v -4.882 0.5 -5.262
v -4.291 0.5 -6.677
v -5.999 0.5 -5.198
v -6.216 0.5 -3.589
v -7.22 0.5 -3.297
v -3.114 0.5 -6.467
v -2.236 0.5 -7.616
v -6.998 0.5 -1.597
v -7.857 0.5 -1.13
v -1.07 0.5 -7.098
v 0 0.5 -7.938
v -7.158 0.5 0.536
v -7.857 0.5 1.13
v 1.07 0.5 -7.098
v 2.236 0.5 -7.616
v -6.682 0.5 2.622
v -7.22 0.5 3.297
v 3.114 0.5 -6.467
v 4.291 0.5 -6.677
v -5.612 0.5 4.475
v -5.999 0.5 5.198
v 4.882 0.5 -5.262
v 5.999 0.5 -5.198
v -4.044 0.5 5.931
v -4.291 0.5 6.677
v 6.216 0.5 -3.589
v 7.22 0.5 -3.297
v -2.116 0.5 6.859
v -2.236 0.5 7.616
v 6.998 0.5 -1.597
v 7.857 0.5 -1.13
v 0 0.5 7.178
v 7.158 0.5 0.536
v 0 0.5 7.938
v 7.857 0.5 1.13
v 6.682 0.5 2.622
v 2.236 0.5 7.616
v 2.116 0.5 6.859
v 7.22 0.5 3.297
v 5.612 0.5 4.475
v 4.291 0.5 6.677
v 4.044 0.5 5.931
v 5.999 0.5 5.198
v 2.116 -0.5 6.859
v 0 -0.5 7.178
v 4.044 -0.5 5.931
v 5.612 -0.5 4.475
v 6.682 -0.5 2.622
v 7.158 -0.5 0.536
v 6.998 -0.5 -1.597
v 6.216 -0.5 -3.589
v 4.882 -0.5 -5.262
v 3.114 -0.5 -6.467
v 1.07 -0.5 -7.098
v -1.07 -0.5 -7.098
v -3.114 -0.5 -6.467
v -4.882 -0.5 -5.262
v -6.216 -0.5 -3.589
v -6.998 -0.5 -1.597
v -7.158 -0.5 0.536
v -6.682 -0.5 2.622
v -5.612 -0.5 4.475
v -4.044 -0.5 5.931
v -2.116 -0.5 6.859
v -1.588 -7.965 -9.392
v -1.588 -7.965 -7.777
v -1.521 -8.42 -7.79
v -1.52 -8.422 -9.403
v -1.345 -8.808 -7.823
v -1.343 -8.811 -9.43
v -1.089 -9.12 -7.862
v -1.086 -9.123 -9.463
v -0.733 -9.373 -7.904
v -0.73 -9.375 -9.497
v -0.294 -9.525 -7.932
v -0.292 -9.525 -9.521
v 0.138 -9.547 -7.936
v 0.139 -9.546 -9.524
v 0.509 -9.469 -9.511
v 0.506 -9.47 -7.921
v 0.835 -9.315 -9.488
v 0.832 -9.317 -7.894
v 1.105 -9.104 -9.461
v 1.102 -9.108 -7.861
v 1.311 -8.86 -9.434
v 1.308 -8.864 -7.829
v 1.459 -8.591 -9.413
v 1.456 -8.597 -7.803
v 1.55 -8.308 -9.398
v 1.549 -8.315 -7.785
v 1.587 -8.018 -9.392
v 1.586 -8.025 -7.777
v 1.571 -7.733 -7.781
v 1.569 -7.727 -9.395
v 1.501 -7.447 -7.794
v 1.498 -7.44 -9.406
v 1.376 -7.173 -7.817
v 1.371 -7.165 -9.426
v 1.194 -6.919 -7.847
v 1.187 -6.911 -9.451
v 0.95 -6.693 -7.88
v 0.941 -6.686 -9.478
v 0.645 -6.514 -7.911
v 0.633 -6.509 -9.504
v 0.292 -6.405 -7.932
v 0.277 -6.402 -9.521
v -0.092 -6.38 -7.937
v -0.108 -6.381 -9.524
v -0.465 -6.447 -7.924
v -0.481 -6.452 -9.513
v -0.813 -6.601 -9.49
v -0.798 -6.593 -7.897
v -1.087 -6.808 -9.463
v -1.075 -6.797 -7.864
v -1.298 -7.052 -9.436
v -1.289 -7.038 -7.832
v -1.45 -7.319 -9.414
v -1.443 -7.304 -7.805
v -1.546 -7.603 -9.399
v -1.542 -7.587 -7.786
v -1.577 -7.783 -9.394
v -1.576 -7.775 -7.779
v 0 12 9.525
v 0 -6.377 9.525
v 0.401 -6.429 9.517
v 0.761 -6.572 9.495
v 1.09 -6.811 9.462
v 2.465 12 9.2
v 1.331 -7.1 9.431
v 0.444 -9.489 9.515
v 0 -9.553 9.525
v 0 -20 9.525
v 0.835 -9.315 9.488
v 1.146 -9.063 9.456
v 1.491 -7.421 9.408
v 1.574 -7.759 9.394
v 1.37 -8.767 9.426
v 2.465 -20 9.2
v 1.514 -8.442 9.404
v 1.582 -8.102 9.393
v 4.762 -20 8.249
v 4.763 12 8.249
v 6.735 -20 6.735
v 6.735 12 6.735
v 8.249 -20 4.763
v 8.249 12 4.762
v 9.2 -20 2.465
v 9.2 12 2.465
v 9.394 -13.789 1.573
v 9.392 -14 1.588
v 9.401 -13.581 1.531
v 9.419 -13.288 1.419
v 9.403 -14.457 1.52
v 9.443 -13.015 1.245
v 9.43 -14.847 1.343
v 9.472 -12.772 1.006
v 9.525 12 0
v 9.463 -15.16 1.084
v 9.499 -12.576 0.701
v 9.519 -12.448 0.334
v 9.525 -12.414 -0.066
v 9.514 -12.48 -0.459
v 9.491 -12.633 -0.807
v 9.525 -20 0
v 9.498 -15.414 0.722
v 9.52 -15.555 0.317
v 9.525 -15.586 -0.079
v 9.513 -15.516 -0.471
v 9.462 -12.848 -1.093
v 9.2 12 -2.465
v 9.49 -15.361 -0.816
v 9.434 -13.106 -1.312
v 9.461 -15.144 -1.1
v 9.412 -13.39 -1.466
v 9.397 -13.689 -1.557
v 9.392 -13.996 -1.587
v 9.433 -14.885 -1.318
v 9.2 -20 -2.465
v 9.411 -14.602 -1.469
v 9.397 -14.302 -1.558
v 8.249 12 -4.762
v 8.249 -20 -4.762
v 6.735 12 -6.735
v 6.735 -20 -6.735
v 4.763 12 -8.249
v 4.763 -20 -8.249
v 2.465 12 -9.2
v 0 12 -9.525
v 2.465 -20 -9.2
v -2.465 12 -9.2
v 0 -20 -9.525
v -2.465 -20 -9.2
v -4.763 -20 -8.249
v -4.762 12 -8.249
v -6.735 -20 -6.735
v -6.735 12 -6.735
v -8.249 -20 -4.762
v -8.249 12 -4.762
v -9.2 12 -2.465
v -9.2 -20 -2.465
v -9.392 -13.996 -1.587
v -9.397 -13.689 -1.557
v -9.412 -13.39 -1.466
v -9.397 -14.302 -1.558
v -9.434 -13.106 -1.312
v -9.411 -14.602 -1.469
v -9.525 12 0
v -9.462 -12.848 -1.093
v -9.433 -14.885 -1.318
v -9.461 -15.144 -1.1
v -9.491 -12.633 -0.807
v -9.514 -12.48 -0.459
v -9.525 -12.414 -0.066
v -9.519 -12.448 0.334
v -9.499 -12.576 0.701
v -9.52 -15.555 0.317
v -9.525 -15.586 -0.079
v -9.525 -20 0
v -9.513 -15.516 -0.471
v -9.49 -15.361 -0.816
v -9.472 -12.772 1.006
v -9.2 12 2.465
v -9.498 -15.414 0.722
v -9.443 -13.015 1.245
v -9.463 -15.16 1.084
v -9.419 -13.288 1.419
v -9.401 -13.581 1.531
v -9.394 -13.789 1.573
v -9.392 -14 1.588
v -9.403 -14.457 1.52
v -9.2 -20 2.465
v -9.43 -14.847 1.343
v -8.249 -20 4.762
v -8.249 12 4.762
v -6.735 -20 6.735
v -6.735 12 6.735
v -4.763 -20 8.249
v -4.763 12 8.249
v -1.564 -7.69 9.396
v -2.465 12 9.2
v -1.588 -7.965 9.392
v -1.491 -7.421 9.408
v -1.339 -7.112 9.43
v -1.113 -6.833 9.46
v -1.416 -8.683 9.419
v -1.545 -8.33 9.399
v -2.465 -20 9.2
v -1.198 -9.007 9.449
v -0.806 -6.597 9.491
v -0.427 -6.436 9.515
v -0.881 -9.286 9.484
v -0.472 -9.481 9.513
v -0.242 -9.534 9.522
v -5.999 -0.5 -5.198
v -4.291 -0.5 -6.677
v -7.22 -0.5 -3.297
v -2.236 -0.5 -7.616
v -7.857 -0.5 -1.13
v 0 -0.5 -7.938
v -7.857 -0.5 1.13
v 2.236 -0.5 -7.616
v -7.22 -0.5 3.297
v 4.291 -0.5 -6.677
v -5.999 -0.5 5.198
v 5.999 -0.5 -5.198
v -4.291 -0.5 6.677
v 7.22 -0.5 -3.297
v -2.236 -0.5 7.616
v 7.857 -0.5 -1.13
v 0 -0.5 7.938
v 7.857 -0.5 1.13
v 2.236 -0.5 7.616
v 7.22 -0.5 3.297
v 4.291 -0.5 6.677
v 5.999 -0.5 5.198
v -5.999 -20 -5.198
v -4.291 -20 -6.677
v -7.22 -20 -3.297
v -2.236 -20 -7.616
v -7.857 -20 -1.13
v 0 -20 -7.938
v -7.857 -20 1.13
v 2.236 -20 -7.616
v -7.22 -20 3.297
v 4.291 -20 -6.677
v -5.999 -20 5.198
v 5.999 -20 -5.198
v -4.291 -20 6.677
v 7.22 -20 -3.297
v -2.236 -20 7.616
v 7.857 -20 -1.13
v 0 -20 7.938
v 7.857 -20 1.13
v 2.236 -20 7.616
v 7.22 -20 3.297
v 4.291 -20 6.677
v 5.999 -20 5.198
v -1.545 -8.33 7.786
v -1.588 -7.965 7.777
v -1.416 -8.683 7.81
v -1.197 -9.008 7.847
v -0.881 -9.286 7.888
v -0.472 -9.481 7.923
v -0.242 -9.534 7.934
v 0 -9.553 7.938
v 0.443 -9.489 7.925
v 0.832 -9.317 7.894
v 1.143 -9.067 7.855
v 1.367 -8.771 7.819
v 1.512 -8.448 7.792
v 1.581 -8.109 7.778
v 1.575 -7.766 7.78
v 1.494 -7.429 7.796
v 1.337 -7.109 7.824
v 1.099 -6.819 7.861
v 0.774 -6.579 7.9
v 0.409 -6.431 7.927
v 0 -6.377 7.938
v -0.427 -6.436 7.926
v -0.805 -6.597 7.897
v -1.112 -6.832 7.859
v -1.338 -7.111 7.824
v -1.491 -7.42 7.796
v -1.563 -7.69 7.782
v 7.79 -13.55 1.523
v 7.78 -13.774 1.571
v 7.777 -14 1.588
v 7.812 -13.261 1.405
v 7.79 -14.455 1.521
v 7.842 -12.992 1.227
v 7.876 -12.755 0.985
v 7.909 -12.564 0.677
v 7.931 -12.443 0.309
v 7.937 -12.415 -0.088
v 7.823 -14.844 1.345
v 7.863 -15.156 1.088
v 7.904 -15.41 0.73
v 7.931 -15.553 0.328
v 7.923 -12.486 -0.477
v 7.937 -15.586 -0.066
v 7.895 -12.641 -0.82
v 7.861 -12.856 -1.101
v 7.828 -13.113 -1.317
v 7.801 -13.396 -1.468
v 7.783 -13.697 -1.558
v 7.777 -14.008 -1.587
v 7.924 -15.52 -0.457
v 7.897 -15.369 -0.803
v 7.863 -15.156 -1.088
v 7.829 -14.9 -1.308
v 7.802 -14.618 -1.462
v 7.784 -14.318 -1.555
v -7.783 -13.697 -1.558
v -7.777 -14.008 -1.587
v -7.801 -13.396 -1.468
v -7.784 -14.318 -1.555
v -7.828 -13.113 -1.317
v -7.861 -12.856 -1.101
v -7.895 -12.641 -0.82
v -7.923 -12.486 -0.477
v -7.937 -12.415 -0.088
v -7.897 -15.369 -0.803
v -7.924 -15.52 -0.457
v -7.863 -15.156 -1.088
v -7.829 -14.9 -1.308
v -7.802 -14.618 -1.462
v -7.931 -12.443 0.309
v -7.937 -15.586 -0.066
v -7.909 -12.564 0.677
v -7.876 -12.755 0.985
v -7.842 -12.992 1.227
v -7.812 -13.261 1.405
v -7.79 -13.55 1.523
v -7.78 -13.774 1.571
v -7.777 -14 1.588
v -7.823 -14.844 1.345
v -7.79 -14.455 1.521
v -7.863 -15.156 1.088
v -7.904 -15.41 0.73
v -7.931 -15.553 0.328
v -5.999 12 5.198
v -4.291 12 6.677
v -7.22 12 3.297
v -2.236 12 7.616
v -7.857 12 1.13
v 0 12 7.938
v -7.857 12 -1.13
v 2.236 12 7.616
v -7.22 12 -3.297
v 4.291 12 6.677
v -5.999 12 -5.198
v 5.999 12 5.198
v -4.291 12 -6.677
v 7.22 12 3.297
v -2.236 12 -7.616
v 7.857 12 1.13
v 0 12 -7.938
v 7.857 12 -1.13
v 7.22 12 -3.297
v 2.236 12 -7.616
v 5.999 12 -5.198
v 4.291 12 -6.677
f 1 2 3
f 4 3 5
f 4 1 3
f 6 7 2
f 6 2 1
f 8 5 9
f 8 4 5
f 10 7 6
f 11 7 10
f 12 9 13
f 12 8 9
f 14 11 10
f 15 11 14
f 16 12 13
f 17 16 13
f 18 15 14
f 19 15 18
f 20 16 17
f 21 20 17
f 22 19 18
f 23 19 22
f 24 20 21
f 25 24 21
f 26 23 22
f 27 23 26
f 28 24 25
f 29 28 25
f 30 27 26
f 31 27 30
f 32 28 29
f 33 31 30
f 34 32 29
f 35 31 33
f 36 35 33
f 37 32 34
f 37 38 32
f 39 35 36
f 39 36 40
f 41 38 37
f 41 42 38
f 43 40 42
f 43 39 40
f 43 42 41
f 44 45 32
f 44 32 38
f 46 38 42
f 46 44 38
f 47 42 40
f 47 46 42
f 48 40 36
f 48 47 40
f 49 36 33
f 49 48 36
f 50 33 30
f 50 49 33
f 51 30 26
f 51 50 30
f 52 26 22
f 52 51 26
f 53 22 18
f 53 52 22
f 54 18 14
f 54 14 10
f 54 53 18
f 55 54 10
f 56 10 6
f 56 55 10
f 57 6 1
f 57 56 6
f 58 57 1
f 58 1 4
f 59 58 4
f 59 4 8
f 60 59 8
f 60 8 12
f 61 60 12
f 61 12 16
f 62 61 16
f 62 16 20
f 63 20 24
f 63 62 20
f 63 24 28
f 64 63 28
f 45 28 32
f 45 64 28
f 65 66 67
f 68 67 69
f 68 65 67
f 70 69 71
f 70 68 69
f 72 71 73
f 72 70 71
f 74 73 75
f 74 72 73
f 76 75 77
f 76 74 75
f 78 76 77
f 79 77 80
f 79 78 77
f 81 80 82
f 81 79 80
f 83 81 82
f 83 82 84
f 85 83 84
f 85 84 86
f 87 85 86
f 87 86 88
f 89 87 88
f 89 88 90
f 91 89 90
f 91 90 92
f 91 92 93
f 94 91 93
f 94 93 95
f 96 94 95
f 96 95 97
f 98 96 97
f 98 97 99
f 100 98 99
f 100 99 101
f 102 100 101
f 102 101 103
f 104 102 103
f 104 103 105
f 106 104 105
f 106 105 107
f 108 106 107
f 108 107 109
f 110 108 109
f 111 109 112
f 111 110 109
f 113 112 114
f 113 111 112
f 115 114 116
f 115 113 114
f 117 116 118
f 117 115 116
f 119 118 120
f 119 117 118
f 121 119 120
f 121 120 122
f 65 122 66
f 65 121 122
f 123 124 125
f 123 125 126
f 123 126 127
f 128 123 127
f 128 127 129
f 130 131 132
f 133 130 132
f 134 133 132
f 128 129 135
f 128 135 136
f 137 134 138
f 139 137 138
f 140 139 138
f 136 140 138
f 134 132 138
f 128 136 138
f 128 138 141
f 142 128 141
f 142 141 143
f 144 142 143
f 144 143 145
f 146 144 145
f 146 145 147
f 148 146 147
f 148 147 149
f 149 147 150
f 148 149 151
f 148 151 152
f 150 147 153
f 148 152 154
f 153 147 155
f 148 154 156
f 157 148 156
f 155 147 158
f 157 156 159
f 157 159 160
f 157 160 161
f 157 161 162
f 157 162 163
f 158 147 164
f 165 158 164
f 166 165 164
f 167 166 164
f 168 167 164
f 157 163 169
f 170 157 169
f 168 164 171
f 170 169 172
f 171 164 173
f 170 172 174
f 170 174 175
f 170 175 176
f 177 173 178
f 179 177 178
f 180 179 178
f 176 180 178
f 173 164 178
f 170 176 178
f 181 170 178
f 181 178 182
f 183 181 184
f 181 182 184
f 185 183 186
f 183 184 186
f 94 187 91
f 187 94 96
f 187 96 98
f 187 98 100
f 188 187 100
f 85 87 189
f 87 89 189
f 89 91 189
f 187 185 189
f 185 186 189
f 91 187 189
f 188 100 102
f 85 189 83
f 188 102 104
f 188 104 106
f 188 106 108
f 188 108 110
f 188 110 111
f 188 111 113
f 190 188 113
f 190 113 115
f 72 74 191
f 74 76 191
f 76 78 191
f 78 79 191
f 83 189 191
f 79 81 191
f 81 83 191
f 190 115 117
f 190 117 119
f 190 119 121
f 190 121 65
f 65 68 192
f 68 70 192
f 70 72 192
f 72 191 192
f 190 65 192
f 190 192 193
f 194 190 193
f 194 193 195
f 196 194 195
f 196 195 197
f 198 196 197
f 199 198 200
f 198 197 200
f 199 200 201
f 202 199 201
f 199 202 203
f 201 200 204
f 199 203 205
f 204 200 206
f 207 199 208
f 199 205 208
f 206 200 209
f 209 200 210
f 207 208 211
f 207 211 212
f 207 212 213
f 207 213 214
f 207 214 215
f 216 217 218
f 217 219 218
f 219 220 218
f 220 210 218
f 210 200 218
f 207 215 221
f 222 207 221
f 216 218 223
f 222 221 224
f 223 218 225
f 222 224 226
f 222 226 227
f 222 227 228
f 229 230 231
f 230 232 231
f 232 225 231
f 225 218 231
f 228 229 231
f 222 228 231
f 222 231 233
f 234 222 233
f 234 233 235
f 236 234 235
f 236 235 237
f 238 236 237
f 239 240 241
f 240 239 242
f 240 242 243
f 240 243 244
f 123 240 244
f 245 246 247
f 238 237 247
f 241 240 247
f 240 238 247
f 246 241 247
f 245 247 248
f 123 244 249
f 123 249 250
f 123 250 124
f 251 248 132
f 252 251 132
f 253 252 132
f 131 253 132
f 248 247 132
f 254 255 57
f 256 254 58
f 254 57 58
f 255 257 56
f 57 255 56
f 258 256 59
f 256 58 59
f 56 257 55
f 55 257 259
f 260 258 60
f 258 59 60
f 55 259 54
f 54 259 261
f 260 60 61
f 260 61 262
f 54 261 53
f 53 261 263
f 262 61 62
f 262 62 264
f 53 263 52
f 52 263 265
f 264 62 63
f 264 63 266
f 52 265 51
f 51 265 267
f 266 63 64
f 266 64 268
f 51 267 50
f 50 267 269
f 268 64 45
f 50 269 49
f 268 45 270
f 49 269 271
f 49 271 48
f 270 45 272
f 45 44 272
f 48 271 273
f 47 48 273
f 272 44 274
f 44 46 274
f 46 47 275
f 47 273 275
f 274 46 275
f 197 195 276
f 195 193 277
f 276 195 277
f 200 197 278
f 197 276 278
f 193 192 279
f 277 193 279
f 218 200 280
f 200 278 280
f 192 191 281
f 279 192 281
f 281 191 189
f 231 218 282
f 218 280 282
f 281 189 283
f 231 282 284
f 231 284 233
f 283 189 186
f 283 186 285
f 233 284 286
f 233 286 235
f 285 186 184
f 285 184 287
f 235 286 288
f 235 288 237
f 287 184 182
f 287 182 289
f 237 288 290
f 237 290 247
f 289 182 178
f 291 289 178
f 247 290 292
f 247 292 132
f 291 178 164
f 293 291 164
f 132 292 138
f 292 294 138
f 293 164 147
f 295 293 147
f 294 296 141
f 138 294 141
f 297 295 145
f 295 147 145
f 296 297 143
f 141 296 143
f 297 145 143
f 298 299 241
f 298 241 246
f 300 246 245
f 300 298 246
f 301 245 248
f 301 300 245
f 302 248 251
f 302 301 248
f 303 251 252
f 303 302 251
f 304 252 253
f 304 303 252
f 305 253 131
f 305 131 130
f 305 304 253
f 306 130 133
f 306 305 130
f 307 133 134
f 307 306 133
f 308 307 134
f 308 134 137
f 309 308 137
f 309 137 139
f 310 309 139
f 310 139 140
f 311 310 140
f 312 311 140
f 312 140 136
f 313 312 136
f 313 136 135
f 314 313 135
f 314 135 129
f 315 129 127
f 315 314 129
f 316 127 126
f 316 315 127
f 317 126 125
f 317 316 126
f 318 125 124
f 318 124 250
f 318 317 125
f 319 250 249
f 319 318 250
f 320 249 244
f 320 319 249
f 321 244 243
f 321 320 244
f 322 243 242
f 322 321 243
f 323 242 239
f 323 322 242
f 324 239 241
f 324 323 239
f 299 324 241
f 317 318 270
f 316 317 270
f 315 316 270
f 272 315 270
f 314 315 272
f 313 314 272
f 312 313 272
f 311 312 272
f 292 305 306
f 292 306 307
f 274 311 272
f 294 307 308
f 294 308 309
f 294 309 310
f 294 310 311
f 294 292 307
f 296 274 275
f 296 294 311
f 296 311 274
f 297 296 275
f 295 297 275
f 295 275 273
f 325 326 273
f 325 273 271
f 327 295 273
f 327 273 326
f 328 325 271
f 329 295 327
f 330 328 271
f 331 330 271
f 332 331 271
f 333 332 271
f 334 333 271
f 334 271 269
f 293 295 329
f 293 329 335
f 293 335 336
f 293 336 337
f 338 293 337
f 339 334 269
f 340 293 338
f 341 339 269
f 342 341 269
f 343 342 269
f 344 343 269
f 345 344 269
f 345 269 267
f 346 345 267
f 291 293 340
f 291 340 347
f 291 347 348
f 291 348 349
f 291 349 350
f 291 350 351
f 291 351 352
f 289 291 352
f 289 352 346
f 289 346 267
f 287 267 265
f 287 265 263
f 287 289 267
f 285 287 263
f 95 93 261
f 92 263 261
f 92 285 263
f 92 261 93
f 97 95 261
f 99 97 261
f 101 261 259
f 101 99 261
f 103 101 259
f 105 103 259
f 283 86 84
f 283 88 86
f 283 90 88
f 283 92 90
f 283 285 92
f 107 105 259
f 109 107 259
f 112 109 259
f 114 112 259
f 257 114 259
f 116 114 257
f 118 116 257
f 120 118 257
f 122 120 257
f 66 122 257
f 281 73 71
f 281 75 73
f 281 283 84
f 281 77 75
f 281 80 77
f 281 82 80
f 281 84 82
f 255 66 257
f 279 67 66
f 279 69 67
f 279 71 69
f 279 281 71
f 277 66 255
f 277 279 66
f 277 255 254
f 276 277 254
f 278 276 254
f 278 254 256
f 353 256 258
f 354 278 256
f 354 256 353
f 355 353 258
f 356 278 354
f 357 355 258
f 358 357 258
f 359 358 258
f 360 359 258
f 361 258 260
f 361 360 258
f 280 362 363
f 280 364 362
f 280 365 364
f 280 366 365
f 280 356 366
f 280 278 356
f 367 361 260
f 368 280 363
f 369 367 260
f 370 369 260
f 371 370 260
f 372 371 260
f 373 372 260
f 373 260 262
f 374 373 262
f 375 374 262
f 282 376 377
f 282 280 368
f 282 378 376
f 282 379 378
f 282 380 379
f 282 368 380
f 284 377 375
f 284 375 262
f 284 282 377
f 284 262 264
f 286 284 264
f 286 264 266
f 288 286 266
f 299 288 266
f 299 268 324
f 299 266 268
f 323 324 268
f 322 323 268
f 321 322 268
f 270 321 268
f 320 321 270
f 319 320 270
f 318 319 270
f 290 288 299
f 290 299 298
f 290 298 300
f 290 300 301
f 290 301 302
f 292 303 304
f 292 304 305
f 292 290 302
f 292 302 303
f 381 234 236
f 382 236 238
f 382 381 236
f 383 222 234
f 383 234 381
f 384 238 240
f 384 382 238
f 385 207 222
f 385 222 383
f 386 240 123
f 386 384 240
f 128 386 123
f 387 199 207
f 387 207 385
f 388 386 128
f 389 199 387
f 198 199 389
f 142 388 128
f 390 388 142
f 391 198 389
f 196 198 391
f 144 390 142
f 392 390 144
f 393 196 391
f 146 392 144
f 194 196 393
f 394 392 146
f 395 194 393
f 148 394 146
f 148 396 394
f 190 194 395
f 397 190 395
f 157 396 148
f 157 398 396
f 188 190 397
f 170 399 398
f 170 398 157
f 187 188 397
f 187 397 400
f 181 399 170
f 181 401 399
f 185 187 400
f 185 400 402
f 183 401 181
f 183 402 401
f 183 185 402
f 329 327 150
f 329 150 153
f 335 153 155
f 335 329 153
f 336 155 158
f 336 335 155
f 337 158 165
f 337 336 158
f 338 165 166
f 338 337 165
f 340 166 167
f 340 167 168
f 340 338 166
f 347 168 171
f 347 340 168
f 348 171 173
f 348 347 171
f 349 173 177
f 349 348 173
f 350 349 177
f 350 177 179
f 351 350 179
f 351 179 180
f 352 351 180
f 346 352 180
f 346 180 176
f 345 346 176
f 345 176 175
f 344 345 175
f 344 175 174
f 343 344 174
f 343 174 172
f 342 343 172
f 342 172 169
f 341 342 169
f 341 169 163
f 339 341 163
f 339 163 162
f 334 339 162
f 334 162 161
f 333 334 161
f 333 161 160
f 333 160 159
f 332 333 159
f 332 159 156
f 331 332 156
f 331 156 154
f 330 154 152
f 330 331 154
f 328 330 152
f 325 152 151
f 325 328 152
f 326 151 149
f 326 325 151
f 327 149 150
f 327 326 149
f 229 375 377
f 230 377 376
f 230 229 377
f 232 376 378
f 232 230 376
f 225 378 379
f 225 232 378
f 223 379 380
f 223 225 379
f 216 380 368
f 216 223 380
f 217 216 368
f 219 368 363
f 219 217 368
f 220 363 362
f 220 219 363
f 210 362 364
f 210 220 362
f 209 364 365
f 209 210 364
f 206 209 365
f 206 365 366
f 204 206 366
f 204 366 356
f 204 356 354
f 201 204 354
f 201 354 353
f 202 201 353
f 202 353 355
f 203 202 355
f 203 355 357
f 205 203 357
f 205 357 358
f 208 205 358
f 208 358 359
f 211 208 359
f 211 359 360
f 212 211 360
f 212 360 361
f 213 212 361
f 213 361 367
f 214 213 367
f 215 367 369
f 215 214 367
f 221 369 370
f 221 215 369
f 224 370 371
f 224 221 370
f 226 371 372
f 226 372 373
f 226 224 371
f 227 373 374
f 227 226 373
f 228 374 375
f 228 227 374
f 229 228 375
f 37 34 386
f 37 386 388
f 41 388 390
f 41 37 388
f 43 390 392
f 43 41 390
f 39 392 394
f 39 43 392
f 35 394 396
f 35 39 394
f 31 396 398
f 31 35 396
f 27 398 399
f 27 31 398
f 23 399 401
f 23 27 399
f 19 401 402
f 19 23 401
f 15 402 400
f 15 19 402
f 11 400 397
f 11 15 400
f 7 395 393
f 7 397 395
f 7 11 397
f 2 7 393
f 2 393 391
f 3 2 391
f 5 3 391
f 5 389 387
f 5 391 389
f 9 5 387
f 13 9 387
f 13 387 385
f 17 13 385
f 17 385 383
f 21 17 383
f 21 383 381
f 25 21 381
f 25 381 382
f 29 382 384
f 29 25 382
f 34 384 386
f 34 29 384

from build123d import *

# Parameters (mm, degrees)
BOSS_EXTRUDE1_DEPTH      = 20
BOSS_EXTRUDE1_DEPTH_BACK = 20
SKETCH1_R                = 9.525
SKETCH1_R_2              = 7.9375
BOSS_EXTRUDE2_DEPTH      = 0.5
BOSS_EXTRUDE2_DEPTH_BACK = 0.5
SKETCH2_R                = 7.9375
SKETCH2_R_2              = 7.178079091
CUT_EXTRUDE1_DEPTH       = 10
CUT_EXTRUDE1_DEPTH_BACK  = 10
SKETCH3_R                = 1.5875
CUT_EXTRUDE2_DEPTH       = 10
CUT_EXTRUDE2_DEPTH_BACK  = 10
SKETCH4_R                = 1.5875
SKETCH5_W                = 27.464518432
SKETCH5_H                = 24.266513238
CUT_EXTRUDE3_DEPTH       = 8


with BuildPart() as part:
    # Sketch1 → Boss-Extrude1 (new, two sides: drawn at the far end of the back side and taken through both)
    with BuildSketch(Plane(origin=(0, 0, 0), x_dir=(1, 0, 0), z_dir=(0, 1, 0)).offset(-BOSS_EXTRUDE1_DEPTH_BACK)):
        Circle(SKETCH1_R)
        Circle(SKETCH1_R_2, mode=Mode.SUBTRACT)
    extrude(amount=BOSS_EXTRUDE1_DEPTH + BOSS_EXTRUDE1_DEPTH_BACK)

    # Sketch2 → Boss-Extrude2 (add, two sides: drawn at the far end of the back side and taken through both)
    with BuildSketch(Plane(origin=(0, 0, 0), x_dir=(1, 0, 0), z_dir=(0, 1, 0)).offset(-BOSS_EXTRUDE2_DEPTH_BACK)):
        Circle(SKETCH2_R)
        Circle(SKETCH2_R_2, mode=Mode.SUBTRACT)
    extrude(amount=BOSS_EXTRUDE2_DEPTH + BOSS_EXTRUDE2_DEPTH_BACK)

    # Sketch3 → Cut-Extrude1 (cut, two sides: drawn at the far end of the back side and taken through both)
    with BuildSketch(Plane(origin=(0, 0, 0), x_dir=(0, 0, -1), z_dir=(1, 0, 0)).offset(-CUT_EXTRUDE1_DEPTH_BACK)):
        with Locations((0, -14)):
            Circle(SKETCH3_R)
    extrude(amount=CUT_EXTRUDE1_DEPTH + CUT_EXTRUDE1_DEPTH_BACK, mode=Mode.SUBTRACT)

    # Sketch4 → Cut-Extrude2 (cut, two sides: drawn at the far end of the back side and taken through both)
    with BuildSketch(Plane.XY.offset(-CUT_EXTRUDE2_DEPTH_BACK)):
        with Locations((0, -7.965)):
            Circle(SKETCH4_R)
    extrude(amount=CUT_EXTRUDE2_DEPTH + CUT_EXTRUDE2_DEPTH_BACK, mode=Mode.SUBTRACT)

    # Sketch5 → Cut-Extrude3 (cut)
    with BuildSketch(Plane(origin=(0, 20, 0), x_dir=(1, 0, 0), z_dir=(0, 1, 0))):
        Rectangle(SKETCH5_W, SKETCH5_H)
    extrude(amount=-CUT_EXTRUDE3_DEPTH, mode=Mode.SUBTRACT)


solid = part.part
